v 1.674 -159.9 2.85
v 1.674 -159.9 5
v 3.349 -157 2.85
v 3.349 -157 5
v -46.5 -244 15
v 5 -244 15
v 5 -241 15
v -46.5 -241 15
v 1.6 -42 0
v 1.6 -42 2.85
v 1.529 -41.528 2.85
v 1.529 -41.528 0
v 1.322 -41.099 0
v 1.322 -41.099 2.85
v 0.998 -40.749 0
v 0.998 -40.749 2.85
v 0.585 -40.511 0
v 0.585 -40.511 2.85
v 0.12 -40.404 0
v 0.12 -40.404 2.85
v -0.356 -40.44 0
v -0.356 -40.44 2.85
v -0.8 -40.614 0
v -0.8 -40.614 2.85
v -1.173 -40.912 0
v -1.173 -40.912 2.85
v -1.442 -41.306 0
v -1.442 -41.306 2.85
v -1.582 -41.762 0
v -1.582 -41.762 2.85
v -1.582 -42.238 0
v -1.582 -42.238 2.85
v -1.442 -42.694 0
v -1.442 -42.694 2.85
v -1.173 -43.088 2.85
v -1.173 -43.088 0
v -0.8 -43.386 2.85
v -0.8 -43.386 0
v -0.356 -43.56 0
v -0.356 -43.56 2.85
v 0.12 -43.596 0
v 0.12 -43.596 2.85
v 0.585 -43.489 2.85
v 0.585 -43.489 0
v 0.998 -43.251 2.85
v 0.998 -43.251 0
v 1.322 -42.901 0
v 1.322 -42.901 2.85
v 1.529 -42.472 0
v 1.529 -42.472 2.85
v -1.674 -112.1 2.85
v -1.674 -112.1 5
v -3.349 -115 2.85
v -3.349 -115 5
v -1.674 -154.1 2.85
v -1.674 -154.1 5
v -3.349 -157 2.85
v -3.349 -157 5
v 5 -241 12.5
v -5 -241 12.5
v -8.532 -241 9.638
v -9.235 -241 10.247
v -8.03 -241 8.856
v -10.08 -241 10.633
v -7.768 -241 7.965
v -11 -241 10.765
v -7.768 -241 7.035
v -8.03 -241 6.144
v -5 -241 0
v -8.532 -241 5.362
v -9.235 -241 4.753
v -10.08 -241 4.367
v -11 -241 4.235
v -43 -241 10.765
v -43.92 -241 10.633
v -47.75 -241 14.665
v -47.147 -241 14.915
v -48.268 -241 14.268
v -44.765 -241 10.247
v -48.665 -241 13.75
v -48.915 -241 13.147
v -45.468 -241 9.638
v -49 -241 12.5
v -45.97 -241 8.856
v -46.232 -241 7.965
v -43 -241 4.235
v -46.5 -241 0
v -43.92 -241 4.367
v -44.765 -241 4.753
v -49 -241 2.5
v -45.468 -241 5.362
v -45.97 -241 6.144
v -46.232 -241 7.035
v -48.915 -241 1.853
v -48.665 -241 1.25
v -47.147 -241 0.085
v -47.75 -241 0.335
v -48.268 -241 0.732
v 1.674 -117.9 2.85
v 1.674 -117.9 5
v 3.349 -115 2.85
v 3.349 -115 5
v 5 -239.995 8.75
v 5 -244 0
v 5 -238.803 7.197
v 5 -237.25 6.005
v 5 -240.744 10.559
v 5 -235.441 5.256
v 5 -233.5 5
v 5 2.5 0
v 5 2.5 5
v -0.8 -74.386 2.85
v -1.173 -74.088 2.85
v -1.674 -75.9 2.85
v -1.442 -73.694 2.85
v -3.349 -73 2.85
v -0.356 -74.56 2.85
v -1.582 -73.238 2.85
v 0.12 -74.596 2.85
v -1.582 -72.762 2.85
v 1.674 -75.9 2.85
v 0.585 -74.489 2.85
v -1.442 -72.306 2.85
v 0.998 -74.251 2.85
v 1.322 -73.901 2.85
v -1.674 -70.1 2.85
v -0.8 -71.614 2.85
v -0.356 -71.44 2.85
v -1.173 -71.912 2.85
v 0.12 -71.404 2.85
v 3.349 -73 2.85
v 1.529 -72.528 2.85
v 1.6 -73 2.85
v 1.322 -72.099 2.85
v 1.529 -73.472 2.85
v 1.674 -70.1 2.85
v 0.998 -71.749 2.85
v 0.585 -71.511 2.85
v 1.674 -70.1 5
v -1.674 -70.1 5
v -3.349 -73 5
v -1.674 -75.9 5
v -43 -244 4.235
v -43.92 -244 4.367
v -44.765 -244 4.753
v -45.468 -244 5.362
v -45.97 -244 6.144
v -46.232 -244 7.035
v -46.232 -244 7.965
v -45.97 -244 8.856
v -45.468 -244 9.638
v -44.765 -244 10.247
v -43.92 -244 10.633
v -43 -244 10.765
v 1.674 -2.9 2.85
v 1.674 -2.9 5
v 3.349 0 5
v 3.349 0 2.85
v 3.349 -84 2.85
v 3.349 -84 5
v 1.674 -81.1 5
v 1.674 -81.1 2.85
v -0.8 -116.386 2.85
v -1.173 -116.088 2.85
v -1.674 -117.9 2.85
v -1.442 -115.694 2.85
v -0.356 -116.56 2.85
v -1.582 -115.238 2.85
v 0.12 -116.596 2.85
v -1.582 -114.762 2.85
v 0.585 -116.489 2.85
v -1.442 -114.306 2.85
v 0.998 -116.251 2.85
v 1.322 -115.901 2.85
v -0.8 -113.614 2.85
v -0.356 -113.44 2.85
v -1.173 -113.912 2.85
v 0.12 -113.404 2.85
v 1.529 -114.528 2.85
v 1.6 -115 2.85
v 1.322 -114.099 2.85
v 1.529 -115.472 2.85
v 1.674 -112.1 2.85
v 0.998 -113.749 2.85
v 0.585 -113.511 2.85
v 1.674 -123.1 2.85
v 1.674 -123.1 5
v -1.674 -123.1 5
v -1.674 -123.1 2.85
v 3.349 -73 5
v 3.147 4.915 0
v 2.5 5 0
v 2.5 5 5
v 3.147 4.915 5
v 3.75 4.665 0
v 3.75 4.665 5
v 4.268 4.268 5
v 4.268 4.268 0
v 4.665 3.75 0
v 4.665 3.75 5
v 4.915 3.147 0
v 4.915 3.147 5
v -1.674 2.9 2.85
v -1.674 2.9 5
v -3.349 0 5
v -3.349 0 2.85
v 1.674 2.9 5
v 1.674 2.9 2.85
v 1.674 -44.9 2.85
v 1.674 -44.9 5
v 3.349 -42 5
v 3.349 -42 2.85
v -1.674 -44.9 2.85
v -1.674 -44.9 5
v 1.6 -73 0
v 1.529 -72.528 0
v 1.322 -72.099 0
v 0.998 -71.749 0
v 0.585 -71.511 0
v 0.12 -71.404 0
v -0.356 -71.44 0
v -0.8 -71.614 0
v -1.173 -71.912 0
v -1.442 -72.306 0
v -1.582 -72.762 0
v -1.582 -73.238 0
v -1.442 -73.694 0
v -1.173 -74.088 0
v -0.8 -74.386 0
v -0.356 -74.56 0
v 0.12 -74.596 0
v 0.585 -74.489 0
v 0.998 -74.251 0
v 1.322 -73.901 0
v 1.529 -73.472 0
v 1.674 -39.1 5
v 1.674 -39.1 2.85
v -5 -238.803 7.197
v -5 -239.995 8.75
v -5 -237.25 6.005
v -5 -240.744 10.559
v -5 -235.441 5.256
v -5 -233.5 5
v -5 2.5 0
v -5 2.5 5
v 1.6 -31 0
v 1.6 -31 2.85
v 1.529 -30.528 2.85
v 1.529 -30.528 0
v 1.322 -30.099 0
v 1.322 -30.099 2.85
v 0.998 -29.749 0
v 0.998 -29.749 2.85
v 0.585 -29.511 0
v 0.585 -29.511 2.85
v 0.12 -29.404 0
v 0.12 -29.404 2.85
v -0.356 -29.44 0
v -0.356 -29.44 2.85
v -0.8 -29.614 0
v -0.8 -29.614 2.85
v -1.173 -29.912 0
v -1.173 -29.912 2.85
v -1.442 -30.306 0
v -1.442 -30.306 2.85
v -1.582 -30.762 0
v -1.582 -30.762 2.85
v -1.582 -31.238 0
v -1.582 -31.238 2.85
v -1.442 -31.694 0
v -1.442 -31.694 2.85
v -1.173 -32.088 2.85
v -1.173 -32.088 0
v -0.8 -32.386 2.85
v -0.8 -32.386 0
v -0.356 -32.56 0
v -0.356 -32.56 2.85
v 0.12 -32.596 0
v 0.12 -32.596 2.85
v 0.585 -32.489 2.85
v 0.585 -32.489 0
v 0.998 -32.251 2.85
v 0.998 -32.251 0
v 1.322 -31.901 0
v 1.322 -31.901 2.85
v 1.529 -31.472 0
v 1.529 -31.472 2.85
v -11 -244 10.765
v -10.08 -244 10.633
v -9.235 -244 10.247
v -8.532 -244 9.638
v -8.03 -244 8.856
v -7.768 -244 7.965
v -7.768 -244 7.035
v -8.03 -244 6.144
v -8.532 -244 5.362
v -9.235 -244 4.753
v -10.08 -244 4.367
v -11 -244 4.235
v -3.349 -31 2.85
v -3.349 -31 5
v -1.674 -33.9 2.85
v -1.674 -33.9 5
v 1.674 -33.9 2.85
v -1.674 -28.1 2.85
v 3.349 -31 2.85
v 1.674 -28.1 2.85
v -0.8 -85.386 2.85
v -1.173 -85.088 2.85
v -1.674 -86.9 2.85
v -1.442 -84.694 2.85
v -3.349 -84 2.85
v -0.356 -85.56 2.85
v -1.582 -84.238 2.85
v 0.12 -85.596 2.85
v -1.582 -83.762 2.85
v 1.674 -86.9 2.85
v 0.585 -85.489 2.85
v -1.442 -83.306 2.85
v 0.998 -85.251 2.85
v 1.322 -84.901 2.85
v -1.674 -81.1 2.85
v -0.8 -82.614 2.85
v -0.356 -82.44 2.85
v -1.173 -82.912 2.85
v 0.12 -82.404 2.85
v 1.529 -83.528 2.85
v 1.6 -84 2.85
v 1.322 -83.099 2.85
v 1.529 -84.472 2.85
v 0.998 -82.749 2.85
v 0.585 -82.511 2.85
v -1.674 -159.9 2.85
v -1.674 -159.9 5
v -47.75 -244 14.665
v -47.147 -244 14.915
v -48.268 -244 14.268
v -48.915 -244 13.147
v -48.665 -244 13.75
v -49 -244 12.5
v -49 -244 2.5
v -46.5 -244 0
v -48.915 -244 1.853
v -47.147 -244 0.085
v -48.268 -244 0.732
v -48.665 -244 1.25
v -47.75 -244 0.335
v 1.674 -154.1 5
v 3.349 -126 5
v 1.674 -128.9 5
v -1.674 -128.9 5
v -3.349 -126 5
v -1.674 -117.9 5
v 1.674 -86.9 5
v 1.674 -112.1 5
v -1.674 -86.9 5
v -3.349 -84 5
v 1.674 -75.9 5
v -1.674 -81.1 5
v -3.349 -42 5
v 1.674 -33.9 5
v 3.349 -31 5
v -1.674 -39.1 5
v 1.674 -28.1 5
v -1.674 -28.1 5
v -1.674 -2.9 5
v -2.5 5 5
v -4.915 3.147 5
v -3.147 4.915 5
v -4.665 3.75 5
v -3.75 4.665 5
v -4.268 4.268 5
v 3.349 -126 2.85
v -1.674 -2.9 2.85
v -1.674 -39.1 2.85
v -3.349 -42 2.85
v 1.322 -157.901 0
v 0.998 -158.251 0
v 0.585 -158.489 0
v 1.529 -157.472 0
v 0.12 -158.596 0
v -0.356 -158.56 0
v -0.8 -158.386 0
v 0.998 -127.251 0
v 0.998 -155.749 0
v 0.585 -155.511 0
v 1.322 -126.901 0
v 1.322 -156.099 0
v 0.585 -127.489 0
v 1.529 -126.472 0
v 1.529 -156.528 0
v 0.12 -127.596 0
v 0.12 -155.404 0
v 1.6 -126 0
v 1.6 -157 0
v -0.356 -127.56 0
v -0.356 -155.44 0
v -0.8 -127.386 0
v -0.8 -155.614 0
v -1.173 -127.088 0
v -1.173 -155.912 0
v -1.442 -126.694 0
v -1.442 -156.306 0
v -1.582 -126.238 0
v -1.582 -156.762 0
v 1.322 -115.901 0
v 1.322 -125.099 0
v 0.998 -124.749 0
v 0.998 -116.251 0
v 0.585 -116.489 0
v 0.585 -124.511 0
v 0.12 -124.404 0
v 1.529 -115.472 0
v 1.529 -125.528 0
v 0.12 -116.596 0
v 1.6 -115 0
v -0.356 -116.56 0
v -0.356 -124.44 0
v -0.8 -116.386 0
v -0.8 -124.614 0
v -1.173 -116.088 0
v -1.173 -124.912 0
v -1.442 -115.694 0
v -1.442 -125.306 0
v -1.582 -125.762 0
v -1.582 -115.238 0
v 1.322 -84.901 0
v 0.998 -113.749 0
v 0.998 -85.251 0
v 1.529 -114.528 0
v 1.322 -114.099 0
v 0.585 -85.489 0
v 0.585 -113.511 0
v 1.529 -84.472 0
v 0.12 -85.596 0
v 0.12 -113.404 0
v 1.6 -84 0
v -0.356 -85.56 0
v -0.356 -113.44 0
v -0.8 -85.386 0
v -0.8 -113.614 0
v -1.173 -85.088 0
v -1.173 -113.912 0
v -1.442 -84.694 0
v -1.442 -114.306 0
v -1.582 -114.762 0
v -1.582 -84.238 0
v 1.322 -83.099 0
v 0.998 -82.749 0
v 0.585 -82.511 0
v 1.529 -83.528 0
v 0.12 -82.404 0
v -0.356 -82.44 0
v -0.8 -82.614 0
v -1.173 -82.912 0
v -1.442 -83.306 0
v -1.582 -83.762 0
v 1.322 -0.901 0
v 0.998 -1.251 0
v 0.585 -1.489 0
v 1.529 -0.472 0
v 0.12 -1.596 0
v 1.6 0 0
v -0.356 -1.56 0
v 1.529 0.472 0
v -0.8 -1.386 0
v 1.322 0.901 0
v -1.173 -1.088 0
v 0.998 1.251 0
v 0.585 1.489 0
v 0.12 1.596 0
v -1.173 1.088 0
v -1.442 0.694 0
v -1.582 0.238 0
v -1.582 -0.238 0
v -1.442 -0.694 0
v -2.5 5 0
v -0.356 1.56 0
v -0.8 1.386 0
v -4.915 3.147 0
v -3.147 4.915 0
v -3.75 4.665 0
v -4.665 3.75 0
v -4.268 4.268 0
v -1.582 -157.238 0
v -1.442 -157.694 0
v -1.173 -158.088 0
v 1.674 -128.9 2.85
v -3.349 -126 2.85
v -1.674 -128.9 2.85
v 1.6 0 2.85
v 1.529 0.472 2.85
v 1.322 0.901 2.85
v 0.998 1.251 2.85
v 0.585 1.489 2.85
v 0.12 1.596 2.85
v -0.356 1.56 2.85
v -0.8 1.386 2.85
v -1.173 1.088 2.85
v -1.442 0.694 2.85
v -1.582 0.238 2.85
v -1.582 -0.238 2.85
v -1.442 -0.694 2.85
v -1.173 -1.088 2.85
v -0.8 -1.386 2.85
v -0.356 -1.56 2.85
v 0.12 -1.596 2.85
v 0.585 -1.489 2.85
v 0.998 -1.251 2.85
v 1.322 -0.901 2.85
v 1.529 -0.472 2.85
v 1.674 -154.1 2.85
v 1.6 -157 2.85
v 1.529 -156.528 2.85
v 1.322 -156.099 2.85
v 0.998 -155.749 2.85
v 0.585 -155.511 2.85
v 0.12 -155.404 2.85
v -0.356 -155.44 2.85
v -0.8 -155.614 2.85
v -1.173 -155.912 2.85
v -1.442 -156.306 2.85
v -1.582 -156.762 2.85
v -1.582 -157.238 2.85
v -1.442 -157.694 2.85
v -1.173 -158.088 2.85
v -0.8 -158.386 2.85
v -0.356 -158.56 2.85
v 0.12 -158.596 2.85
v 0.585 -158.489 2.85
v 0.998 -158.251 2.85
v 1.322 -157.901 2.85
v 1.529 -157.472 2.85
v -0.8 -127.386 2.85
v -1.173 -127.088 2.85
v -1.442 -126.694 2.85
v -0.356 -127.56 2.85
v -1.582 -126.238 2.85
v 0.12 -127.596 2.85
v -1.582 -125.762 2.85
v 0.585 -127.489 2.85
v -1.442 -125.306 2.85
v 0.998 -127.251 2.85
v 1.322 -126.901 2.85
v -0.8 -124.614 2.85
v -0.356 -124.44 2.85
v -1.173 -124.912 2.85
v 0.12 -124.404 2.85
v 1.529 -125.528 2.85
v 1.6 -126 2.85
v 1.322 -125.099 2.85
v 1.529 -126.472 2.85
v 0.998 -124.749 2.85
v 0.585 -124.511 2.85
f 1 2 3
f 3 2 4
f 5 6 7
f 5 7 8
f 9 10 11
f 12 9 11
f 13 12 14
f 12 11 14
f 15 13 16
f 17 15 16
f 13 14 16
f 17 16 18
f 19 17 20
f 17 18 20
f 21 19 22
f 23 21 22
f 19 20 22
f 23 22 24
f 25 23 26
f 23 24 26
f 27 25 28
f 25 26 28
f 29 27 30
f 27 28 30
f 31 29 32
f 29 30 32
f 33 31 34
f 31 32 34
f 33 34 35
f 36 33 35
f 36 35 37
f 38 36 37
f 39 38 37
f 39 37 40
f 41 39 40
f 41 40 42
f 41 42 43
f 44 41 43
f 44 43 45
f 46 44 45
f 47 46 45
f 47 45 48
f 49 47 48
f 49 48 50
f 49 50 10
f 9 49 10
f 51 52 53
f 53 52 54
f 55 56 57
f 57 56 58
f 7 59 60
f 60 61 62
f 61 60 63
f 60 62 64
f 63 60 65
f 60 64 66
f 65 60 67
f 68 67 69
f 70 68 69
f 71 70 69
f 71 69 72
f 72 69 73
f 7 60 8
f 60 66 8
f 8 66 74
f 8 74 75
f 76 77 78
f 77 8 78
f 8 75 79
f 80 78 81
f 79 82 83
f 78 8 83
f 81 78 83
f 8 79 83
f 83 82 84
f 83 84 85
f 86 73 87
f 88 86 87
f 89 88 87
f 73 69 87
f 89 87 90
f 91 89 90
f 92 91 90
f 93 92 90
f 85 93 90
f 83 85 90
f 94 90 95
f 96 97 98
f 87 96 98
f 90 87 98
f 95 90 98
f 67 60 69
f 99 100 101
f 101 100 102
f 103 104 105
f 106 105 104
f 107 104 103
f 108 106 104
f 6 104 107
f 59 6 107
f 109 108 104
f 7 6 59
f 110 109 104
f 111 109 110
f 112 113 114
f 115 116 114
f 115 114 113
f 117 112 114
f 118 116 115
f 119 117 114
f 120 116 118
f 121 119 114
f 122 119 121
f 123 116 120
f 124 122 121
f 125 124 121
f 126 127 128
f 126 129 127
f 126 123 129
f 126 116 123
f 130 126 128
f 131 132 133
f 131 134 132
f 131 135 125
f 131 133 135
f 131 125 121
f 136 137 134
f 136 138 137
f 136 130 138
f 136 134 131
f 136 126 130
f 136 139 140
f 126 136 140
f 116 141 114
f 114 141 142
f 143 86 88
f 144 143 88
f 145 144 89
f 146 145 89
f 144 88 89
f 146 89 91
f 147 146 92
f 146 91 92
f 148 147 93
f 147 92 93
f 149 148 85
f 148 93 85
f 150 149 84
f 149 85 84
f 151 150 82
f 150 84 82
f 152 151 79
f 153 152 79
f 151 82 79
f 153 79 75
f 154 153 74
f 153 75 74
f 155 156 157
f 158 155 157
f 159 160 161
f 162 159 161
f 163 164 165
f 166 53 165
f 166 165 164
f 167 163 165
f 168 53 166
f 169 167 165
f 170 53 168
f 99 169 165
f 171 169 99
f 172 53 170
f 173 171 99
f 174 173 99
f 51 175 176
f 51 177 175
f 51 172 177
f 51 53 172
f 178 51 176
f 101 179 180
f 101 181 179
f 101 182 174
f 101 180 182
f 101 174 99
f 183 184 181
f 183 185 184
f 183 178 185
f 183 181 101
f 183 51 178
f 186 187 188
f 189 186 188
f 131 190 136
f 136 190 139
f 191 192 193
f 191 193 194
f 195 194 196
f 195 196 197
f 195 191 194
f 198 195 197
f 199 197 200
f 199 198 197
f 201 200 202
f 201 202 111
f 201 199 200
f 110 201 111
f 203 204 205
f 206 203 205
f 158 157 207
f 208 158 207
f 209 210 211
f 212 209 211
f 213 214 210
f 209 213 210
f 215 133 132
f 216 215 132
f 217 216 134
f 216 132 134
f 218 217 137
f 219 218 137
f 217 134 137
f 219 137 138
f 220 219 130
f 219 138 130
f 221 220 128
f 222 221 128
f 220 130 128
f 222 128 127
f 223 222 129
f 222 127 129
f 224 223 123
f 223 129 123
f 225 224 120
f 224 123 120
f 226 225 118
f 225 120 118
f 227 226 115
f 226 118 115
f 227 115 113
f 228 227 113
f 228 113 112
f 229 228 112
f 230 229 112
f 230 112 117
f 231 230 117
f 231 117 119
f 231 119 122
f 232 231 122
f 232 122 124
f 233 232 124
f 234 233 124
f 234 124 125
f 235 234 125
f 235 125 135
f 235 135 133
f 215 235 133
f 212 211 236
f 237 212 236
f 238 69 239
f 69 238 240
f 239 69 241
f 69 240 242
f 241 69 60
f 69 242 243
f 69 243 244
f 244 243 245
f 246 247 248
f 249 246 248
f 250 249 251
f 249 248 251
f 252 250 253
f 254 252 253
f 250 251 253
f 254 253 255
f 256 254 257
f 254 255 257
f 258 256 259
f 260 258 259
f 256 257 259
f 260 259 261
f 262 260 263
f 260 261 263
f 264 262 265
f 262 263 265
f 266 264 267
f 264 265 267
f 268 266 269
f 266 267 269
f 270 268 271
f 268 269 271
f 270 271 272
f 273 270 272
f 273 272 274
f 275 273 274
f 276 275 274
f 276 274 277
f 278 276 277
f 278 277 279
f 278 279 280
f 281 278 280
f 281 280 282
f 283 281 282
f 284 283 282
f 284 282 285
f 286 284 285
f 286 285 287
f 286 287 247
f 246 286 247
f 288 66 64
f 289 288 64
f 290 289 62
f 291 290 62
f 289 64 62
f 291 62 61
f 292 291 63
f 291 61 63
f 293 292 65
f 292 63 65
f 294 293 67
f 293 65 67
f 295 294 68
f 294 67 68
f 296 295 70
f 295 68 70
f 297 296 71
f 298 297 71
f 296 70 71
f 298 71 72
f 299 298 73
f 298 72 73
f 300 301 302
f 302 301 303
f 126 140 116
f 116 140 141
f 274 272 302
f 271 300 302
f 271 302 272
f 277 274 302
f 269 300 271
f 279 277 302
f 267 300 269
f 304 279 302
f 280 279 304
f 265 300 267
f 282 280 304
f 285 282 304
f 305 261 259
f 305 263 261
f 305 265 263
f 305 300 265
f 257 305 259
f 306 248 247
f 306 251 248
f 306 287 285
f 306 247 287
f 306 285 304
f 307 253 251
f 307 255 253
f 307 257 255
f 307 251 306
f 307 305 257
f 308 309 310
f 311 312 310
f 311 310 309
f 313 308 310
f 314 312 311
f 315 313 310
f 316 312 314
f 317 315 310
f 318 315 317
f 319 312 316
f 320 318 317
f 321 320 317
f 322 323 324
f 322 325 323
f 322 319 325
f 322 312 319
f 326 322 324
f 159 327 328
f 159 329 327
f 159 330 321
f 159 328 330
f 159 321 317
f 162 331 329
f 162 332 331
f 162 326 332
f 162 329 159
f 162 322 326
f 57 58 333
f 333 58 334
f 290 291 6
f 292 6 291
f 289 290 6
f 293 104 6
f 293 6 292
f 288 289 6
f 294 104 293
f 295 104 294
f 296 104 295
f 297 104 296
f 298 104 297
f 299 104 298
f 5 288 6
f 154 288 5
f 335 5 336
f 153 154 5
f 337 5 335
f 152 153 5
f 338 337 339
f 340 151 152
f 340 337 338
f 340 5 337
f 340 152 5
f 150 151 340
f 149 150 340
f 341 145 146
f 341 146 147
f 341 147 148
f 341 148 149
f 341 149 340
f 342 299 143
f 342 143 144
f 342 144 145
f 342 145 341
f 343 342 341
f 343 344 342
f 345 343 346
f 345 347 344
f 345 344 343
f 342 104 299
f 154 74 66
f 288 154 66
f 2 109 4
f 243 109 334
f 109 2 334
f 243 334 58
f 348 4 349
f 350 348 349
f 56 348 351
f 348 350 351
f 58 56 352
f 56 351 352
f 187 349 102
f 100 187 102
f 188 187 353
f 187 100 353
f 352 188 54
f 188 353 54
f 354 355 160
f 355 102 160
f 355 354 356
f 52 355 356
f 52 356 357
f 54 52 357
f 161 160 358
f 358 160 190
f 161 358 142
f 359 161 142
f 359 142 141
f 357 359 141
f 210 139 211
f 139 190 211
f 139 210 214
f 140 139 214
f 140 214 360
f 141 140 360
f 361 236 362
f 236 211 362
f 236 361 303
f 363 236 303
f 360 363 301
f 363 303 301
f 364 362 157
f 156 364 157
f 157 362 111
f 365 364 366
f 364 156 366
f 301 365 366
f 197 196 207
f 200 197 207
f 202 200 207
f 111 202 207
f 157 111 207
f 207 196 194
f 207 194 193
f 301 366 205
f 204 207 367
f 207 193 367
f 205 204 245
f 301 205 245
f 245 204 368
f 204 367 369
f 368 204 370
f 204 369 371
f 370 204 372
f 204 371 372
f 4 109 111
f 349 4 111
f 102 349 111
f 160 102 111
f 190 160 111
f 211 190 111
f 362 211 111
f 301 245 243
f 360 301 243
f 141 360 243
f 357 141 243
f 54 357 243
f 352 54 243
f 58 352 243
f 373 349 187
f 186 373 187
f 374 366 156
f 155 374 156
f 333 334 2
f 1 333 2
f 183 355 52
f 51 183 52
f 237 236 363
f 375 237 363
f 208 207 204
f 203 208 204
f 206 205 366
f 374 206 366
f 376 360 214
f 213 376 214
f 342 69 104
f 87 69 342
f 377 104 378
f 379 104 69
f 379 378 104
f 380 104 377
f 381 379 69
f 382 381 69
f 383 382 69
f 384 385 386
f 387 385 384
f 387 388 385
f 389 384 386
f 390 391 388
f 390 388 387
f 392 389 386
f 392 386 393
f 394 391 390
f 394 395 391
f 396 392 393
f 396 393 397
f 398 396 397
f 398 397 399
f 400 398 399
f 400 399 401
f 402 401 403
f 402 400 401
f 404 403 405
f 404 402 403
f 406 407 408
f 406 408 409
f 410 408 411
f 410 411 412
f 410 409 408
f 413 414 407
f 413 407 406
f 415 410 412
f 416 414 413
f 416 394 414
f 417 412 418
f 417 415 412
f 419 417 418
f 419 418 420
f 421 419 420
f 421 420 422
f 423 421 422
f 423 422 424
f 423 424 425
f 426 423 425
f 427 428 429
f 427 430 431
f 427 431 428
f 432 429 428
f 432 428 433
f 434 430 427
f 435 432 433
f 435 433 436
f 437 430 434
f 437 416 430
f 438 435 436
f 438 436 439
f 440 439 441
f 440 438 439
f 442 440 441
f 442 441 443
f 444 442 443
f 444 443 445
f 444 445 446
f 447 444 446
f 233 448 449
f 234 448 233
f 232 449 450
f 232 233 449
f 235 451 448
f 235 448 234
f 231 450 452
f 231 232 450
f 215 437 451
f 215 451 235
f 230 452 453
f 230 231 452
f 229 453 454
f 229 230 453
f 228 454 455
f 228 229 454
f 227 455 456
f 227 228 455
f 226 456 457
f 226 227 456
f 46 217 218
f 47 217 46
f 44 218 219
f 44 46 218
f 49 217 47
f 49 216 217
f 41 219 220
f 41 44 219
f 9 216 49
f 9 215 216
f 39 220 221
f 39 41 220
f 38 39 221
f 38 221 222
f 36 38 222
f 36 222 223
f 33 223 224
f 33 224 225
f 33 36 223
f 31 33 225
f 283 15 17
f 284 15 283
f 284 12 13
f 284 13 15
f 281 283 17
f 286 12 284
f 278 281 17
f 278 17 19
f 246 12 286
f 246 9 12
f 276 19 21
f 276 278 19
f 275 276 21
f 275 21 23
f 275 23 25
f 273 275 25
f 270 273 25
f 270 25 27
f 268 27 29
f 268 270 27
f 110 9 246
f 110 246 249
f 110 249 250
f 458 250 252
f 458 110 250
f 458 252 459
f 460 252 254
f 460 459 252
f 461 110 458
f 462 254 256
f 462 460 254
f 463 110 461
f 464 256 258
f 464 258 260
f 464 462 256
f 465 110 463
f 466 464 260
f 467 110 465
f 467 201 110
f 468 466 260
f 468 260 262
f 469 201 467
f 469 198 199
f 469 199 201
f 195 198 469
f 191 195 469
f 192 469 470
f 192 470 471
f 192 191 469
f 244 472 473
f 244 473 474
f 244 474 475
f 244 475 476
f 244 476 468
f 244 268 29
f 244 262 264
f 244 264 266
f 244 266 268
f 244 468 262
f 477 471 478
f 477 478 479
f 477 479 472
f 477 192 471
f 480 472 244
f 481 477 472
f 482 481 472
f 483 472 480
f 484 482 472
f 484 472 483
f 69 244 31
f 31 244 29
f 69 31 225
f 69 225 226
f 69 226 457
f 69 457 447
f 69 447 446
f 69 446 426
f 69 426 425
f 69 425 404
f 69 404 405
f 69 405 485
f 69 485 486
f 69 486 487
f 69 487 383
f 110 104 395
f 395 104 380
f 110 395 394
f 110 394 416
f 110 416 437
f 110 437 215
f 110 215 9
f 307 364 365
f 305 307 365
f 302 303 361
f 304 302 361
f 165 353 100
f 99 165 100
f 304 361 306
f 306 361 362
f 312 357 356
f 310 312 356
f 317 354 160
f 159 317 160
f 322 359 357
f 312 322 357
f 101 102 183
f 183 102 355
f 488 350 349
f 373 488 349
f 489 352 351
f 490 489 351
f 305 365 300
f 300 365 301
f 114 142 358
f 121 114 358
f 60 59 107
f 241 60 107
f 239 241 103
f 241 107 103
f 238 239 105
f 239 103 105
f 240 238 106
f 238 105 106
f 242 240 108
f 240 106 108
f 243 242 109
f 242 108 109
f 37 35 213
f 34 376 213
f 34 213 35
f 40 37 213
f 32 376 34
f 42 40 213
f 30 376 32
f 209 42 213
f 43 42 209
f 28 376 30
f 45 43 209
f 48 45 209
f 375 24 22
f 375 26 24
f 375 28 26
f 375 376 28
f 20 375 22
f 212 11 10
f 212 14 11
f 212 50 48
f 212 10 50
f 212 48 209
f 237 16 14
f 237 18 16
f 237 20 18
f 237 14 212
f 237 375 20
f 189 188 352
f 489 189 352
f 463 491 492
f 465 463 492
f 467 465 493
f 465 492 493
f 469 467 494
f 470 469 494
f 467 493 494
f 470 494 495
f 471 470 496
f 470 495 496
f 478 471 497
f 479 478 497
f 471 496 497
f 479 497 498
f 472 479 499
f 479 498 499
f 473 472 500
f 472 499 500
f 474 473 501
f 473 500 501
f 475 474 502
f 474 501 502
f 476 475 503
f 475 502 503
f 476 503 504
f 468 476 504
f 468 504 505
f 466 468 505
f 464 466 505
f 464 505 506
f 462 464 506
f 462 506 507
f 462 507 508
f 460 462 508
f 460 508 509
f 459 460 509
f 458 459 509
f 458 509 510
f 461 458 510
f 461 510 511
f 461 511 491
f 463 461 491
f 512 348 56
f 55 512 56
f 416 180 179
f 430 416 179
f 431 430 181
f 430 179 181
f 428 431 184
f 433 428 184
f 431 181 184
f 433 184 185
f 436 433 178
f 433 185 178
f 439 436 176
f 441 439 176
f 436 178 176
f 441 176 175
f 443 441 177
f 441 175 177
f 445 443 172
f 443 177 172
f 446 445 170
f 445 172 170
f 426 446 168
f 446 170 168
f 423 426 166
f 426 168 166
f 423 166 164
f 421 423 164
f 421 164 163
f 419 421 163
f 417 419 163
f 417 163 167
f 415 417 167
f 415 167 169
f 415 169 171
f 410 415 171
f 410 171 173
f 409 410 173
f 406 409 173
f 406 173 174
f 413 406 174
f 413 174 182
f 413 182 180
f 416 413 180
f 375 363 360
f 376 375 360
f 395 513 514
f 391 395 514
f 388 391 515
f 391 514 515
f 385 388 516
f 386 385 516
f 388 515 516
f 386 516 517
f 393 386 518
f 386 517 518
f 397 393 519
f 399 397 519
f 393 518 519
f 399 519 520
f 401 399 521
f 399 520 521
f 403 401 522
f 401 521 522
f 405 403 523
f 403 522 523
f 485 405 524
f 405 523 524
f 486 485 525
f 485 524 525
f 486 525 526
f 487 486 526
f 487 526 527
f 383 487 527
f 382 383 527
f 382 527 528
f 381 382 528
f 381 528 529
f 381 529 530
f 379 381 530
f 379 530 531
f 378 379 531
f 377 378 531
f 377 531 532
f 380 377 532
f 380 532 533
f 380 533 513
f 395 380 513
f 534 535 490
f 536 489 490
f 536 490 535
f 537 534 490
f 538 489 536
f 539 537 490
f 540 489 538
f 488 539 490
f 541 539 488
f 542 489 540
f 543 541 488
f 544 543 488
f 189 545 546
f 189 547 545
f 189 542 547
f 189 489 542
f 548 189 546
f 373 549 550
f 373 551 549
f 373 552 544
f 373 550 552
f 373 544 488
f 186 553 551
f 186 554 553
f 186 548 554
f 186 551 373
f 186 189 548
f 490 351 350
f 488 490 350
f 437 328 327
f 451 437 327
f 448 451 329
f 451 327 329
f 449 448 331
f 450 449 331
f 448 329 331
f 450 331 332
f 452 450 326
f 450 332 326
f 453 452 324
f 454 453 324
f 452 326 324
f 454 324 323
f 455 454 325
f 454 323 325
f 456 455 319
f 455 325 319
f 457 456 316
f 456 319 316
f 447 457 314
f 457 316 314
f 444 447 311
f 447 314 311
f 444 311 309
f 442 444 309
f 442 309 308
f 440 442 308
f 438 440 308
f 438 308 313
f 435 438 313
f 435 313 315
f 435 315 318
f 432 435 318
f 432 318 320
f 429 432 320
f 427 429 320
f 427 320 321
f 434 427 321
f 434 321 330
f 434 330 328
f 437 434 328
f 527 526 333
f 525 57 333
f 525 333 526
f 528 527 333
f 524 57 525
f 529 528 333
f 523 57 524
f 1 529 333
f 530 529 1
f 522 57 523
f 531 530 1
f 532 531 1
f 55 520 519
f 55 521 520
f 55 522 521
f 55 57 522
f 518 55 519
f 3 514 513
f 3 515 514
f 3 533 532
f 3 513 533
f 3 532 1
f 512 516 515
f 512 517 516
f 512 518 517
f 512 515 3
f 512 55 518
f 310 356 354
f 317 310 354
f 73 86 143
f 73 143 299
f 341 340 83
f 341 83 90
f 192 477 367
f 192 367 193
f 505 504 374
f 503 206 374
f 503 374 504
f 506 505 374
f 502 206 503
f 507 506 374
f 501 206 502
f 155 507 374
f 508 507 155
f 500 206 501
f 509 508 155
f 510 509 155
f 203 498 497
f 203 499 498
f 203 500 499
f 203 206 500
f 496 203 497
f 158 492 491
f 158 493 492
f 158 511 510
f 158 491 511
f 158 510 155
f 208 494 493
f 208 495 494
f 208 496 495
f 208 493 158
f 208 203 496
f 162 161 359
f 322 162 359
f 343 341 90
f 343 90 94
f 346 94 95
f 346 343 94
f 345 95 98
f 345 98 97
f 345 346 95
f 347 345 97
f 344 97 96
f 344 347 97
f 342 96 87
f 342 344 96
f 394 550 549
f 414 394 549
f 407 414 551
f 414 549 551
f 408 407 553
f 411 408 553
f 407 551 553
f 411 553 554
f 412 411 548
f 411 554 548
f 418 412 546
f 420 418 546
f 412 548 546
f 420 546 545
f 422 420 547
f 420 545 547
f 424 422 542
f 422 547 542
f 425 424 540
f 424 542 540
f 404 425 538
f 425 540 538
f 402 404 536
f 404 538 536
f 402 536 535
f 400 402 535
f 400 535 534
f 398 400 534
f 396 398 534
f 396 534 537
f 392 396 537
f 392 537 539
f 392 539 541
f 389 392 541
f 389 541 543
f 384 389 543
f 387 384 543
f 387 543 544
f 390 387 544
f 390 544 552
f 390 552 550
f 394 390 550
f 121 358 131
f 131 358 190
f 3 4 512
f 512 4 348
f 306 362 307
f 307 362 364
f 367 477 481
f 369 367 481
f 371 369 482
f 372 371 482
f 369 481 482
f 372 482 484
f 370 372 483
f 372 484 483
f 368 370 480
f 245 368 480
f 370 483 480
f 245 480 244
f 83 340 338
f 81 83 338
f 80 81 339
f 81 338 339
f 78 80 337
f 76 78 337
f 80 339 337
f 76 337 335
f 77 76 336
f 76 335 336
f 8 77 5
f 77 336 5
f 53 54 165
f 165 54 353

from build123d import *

# Parameters (mm, degrees)
PAD_DEPTH                    = 5
POCKET_DEPTH                 = 2.15
SKETCH002_R                  = 1.6
HOLE_DEPTH                   = 501.352755
POCKET_LINEARPATTERN_2_DEPTH = 2.15
SKETCH002_LINEARPATTERN_2_R  = 1.6
HOLE_LINEARPATTERN_2_DEPTH   = 501.352755
LINEARPATTERN001_COUNT       = 4
LINEARPATTERN001_PITCH       = 42
PAD001_DEPTH                 = 3
POCKET001_DEPTH              = 3.001
PAD002_DEPTH                 = 10


with BuildPart() as part:
    # Sketch → Pad (new body)
    with BuildSketch(Plane.XY):
        with BuildLine():
            Line((0, 5), (-2.5, 5))
            ThreePointArc((-2.5, 5), (-4.267767, 4.267767), (-5, 2.5))
            Line((-5, 2.5), (-5, -244))
            Line((-5, -244), (0, -244))
            Line((0, -244), (0, 5))
        make_face()
    pad = extrude(amount=PAD_DEPTH)

    # Mirrored: Pad across Sketch V_Axis
    add(pad.mirror(Plane(origin=(0, 0, 0), x_dir=(0, 0, 1), z_dir=(1, 0, 0))))

    # Sketch001 (on Face5 of Mirrored) → Pocket (cut)
    with BuildSketch(Plane.XY.offset(5)):
        Polygon((3.348632, 0), (1.674316, 2.9), (-1.674316, 2.9), (-3.348632, 0), (-1.674316, -2.9), (1.674316, -2.9), align=None)
    pocket = extrude(amount=-POCKET_DEPTH, mode=Mode.SUBTRACT)

    # Sketch002 (on Face19 of Pocket) → Hole (cut, through all)
    with BuildSketch(Plane.XY.offset(2.85)):
        Circle(SKETCH002_R)
    hole = extrude(amount=-HOLE_DEPTH, mode=Mode.SUBTRACT)

    # Sketch001 LinearPattern 2 → Pocket LinearPattern 2 (cut)
    with BuildSketch(Plane(origin=(0, -31, 5), x_dir=(1, 0, 0), z_dir=(0, 0, 1))):
        Polygon((3.348632, 0), (1.674316, 2.9), (-1.674316, 2.9), (-3.348632, 0), (-1.674316, -2.9), (1.674316, -2.9), align=None)
    pocket_linearpattern_2 = extrude(amount=-POCKET_LINEARPATTERN_2_DEPTH, mode=Mode.SUBTRACT)

    # Sketch002 LinearPattern 2 → Hole LinearPattern 2 (cut, through all)
    with BuildSketch(Plane(origin=(0, -31, 2.85), x_dir=(1, 0, 0), z_dir=(0, 0, 1))):
        Circle(SKETCH002_LINEARPATTERN_2_R)
    hole_linearpattern_2 = extrude(amount=-HOLE_LINEARPATTERN_2_DEPTH, mode=Mode.SUBTRACT)

    # LinearPattern001: Pocket, Hole, Pocket LinearPattern 2, Hole LinearPattern 2 ×4
    with Locations(*[(0, -i * LINEARPATTERN001_PITCH, 0) for i in range(1, LINEARPATTERN001_COUNT)]):
        add(pocket, mode=Mode.SUBTRACT)
        add(hole, mode=Mode.SUBTRACT)
        add(pocket_linearpattern_2, mode=Mode.SUBTRACT)
        add(hole_linearpattern_2, mode=Mode.SUBTRACT)

    # Sketch004 (on Face15 of MultiTransform) → Pad001 (join)
    with BuildSketch(Plane.XZ.offset(244)):
        with BuildLine():
            Line((5, 0), (-46.5, 0))
            ThreePointArc((-49, 2.5), (-48.267767, 0.732233), (-46.5, 0))
            Line((-49, 2.5), (-49, 7.5))
            Line((-49, 7.5), (5, 7.5))
            Line((5, 7.5), (5, 0))
        make_face()
    pad001 = extrude(amount=-PAD001_DEPTH)

    # Mirrored001: Pad001 across face of Pad001
    add(pad001.mirror(Plane(origin=(-22, -242.5, 7.5), x_dir=(1, 0, 0), z_dir=(0, 0, 1))))

    # Sketch005 (on Face51 of Mirrored001) → Pocket001 (cut, through all)
    with BuildSketch(Plane(origin=(0, -241, 0), x_dir=(-1, 0, 0), z_dir=(0, 1, 0))):
        with BuildLine():
            ThreePointArc((43, 4.235), (46.265, 7.5), (43, 10.765))
            Line((43, 10.765), (11, 10.765))
            ThreePointArc((11, 10.765), (7.735, 7.5), (11, 4.235))
            Line((43, 4.235), (11, 4.235))
        make_face()
    extrude(amount=-POCKET001_DEPTH, mode=Mode.SUBTRACT)

    # Sketch007 (on Face52 of Pocket001) → Pad002 (join)
    with BuildSketch(Plane.YZ.offset(5)):
        with BuildLine():
            Line((-241, 5), (-233.499977, 5))
            ThreePointArc((-241, 12.500001), (-238.803293, 7.196691), (-233.499977, 5))
            Line((-241, 5), (-241, 12.500001))
        make_face()
    extrude(amount=-PAD002_DEPTH)


solid = part.part
